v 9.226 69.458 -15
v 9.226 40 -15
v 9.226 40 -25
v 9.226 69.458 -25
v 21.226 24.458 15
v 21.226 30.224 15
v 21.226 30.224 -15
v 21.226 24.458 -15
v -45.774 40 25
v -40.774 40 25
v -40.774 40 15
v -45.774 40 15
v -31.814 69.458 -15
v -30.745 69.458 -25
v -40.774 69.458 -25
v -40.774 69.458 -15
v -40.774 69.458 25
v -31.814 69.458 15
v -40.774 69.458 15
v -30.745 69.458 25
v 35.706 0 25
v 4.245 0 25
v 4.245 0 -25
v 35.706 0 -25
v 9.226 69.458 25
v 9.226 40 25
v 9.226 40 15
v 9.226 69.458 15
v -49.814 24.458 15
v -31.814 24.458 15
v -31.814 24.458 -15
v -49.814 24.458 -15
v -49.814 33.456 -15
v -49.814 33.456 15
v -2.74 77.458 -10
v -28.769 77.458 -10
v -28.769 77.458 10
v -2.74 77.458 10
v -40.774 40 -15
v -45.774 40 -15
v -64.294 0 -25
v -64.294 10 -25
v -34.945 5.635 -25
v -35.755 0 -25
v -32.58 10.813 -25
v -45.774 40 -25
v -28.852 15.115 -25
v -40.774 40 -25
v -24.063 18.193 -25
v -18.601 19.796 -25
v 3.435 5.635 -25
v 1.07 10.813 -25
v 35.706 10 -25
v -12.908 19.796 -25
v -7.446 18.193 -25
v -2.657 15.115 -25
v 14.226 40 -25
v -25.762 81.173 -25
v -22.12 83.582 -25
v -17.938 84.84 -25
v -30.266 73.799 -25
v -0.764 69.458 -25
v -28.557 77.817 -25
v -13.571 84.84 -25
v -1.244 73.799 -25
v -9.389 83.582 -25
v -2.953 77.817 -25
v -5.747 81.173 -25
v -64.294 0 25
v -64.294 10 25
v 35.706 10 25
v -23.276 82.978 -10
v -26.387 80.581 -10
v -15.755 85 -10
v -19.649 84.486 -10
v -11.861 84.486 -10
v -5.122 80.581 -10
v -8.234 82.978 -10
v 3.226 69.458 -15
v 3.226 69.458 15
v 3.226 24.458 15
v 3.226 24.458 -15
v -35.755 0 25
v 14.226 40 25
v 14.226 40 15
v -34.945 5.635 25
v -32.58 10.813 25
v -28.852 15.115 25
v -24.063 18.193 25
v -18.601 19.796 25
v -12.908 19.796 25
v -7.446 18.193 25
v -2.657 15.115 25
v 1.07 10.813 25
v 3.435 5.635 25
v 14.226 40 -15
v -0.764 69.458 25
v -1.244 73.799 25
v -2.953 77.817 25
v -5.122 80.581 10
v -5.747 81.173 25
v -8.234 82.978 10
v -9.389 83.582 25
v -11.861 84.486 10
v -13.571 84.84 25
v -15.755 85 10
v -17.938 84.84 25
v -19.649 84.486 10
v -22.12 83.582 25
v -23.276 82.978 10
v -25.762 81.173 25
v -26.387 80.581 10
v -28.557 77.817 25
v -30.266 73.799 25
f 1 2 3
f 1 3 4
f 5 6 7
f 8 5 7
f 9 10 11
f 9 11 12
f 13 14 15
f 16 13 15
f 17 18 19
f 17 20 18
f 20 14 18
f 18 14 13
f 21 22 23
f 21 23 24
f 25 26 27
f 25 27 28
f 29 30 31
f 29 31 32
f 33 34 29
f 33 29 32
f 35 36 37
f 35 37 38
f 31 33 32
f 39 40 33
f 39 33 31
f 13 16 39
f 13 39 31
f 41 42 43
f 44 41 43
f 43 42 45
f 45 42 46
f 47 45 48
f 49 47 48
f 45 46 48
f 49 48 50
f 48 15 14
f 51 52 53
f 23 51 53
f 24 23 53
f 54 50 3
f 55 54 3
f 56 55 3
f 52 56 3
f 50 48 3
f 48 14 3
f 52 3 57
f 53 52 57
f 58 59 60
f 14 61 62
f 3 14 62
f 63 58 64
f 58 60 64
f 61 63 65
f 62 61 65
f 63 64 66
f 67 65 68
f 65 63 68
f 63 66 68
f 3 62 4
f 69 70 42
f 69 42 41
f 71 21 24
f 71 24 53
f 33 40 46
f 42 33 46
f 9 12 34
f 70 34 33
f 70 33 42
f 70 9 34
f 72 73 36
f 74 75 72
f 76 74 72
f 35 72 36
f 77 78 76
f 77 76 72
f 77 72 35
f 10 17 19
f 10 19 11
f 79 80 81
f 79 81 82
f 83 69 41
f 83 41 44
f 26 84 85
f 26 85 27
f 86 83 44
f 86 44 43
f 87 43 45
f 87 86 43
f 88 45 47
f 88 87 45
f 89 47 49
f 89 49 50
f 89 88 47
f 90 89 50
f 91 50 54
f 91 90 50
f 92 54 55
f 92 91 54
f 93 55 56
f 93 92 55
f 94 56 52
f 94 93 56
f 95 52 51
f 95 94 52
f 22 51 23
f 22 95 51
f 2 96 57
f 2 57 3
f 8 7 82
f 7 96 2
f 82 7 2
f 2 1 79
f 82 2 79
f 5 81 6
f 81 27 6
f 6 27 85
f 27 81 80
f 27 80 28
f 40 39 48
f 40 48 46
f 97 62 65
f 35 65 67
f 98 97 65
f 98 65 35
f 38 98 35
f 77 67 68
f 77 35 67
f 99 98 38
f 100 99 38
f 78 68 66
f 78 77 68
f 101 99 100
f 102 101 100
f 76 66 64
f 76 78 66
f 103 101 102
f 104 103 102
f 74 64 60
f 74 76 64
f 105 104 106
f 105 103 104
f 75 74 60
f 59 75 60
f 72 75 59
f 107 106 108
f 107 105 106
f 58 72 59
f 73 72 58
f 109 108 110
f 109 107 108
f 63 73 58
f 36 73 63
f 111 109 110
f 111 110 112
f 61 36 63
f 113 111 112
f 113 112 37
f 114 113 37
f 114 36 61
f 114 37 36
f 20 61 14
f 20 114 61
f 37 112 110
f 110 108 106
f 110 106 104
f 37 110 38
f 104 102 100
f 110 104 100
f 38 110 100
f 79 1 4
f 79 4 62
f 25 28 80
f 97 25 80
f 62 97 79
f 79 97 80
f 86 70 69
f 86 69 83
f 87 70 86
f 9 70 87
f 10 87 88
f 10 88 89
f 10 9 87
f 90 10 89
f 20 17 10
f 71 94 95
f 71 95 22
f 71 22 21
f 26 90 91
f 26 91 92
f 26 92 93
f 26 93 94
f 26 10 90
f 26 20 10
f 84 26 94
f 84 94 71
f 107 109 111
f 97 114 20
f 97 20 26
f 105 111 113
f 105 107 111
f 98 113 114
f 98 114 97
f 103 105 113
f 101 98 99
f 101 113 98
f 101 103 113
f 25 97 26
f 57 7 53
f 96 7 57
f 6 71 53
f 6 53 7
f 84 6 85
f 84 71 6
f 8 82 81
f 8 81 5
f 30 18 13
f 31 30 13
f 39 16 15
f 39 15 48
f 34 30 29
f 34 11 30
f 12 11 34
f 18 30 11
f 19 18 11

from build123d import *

# Parameters (mm, degrees)
BOSS_EXTRUDE1_DEPTH = 25
SKETCH3_W           = 6
SKETCH3_H           = 30
SKETCH3_W_2         = 12
CUT_EXTRUDE2_DEPTH  = 45
SKETCH4_W           = 41.759295091
SKETCH4_H           = 20
CUT_EXTRUDE4_DEPTH  = 7


with BuildPart() as part:
    # Sketch1 → Boss-Extrude1 (new, symmetric)
    with BuildSketch(Plane.XY):
        with BuildLine():
            Line((9.225854521, 69.458085549), (-0.764451304, 69.458085549))
            ThreePointArc((-0.764451304, 69.458085549), (-15.754659065, 85), (-30.744866826, 69.458085549))
            Line((-30.744866826, 69.458085549), (-40.774145479, 69.458085549))
            Line((-40.774145479, 69.458085549), (-40.774145479, 40))
            Line((-40.774145479, 40), (-45.774145479, 40))
            Line((-45.774145479, 40), (-64.293941681, 10))
            Line((-64.293941681, 10), (-64.293941681, 0))
            Line((-64.293941681, 0), (-35.754659065, 0))
            ThreePointArc((-35.754659065, 0), (-15.754659065, 20), (4.245340935, 0))
            Line((4.245340935, 0), (35.706058319, 0))
            Line((35.706058319, 0), (35.706058319, 10))
            Line((35.706058319, 10), (14.225854521, 40))
            Line((14.225854521, 40), (9.225854521, 40))
            Line((9.225854521, 40), (9.225854521, 69.458085549))
        make_face()
    extrude(amount=BOSS_EXTRUDE1_DEPTH, both=True)

    # Sketch3 → Cut-Extrude2 (cut)
    with BuildSketch(Plane(origin=(0, 69.458085549, 0), x_dir=(1, 0, 0), z_dir=(0, 1, 0))):
        with Locations((6.225854521, 0)):
            Rectangle(SKETCH3_W, SKETCH3_H)
        with Locations((15.225854521, 0)):
            Rectangle(SKETCH3_W_2, SKETCH3_H)
    cut_extrude2 = extrude(amount=-CUT_EXTRUDE2_DEPTH, mode=Mode.SUBTRACT)

    # Mirror1: Cut-Extrude2 across plane
    add(cut_extrude2.mirror(Plane.ZY.offset(14.293941681)), mode=Mode.SUBTRACT)

    # Sketch4 → Cut-Extrude4 (cut, symmetric)
    with BuildSketch(Plane(origin=(0, 84.458085549, 0), x_dir=(1, 0, 0), z_dir=(0, 1, 0))):
        with Locations((-15.754659066, 0)):
            Rectangle(SKETCH4_W, SKETCH4_H)
    extrude(amount=CUT_EXTRUDE4_DEPTH, both=True, mode=Mode.SUBTRACT)


solid = part.part
